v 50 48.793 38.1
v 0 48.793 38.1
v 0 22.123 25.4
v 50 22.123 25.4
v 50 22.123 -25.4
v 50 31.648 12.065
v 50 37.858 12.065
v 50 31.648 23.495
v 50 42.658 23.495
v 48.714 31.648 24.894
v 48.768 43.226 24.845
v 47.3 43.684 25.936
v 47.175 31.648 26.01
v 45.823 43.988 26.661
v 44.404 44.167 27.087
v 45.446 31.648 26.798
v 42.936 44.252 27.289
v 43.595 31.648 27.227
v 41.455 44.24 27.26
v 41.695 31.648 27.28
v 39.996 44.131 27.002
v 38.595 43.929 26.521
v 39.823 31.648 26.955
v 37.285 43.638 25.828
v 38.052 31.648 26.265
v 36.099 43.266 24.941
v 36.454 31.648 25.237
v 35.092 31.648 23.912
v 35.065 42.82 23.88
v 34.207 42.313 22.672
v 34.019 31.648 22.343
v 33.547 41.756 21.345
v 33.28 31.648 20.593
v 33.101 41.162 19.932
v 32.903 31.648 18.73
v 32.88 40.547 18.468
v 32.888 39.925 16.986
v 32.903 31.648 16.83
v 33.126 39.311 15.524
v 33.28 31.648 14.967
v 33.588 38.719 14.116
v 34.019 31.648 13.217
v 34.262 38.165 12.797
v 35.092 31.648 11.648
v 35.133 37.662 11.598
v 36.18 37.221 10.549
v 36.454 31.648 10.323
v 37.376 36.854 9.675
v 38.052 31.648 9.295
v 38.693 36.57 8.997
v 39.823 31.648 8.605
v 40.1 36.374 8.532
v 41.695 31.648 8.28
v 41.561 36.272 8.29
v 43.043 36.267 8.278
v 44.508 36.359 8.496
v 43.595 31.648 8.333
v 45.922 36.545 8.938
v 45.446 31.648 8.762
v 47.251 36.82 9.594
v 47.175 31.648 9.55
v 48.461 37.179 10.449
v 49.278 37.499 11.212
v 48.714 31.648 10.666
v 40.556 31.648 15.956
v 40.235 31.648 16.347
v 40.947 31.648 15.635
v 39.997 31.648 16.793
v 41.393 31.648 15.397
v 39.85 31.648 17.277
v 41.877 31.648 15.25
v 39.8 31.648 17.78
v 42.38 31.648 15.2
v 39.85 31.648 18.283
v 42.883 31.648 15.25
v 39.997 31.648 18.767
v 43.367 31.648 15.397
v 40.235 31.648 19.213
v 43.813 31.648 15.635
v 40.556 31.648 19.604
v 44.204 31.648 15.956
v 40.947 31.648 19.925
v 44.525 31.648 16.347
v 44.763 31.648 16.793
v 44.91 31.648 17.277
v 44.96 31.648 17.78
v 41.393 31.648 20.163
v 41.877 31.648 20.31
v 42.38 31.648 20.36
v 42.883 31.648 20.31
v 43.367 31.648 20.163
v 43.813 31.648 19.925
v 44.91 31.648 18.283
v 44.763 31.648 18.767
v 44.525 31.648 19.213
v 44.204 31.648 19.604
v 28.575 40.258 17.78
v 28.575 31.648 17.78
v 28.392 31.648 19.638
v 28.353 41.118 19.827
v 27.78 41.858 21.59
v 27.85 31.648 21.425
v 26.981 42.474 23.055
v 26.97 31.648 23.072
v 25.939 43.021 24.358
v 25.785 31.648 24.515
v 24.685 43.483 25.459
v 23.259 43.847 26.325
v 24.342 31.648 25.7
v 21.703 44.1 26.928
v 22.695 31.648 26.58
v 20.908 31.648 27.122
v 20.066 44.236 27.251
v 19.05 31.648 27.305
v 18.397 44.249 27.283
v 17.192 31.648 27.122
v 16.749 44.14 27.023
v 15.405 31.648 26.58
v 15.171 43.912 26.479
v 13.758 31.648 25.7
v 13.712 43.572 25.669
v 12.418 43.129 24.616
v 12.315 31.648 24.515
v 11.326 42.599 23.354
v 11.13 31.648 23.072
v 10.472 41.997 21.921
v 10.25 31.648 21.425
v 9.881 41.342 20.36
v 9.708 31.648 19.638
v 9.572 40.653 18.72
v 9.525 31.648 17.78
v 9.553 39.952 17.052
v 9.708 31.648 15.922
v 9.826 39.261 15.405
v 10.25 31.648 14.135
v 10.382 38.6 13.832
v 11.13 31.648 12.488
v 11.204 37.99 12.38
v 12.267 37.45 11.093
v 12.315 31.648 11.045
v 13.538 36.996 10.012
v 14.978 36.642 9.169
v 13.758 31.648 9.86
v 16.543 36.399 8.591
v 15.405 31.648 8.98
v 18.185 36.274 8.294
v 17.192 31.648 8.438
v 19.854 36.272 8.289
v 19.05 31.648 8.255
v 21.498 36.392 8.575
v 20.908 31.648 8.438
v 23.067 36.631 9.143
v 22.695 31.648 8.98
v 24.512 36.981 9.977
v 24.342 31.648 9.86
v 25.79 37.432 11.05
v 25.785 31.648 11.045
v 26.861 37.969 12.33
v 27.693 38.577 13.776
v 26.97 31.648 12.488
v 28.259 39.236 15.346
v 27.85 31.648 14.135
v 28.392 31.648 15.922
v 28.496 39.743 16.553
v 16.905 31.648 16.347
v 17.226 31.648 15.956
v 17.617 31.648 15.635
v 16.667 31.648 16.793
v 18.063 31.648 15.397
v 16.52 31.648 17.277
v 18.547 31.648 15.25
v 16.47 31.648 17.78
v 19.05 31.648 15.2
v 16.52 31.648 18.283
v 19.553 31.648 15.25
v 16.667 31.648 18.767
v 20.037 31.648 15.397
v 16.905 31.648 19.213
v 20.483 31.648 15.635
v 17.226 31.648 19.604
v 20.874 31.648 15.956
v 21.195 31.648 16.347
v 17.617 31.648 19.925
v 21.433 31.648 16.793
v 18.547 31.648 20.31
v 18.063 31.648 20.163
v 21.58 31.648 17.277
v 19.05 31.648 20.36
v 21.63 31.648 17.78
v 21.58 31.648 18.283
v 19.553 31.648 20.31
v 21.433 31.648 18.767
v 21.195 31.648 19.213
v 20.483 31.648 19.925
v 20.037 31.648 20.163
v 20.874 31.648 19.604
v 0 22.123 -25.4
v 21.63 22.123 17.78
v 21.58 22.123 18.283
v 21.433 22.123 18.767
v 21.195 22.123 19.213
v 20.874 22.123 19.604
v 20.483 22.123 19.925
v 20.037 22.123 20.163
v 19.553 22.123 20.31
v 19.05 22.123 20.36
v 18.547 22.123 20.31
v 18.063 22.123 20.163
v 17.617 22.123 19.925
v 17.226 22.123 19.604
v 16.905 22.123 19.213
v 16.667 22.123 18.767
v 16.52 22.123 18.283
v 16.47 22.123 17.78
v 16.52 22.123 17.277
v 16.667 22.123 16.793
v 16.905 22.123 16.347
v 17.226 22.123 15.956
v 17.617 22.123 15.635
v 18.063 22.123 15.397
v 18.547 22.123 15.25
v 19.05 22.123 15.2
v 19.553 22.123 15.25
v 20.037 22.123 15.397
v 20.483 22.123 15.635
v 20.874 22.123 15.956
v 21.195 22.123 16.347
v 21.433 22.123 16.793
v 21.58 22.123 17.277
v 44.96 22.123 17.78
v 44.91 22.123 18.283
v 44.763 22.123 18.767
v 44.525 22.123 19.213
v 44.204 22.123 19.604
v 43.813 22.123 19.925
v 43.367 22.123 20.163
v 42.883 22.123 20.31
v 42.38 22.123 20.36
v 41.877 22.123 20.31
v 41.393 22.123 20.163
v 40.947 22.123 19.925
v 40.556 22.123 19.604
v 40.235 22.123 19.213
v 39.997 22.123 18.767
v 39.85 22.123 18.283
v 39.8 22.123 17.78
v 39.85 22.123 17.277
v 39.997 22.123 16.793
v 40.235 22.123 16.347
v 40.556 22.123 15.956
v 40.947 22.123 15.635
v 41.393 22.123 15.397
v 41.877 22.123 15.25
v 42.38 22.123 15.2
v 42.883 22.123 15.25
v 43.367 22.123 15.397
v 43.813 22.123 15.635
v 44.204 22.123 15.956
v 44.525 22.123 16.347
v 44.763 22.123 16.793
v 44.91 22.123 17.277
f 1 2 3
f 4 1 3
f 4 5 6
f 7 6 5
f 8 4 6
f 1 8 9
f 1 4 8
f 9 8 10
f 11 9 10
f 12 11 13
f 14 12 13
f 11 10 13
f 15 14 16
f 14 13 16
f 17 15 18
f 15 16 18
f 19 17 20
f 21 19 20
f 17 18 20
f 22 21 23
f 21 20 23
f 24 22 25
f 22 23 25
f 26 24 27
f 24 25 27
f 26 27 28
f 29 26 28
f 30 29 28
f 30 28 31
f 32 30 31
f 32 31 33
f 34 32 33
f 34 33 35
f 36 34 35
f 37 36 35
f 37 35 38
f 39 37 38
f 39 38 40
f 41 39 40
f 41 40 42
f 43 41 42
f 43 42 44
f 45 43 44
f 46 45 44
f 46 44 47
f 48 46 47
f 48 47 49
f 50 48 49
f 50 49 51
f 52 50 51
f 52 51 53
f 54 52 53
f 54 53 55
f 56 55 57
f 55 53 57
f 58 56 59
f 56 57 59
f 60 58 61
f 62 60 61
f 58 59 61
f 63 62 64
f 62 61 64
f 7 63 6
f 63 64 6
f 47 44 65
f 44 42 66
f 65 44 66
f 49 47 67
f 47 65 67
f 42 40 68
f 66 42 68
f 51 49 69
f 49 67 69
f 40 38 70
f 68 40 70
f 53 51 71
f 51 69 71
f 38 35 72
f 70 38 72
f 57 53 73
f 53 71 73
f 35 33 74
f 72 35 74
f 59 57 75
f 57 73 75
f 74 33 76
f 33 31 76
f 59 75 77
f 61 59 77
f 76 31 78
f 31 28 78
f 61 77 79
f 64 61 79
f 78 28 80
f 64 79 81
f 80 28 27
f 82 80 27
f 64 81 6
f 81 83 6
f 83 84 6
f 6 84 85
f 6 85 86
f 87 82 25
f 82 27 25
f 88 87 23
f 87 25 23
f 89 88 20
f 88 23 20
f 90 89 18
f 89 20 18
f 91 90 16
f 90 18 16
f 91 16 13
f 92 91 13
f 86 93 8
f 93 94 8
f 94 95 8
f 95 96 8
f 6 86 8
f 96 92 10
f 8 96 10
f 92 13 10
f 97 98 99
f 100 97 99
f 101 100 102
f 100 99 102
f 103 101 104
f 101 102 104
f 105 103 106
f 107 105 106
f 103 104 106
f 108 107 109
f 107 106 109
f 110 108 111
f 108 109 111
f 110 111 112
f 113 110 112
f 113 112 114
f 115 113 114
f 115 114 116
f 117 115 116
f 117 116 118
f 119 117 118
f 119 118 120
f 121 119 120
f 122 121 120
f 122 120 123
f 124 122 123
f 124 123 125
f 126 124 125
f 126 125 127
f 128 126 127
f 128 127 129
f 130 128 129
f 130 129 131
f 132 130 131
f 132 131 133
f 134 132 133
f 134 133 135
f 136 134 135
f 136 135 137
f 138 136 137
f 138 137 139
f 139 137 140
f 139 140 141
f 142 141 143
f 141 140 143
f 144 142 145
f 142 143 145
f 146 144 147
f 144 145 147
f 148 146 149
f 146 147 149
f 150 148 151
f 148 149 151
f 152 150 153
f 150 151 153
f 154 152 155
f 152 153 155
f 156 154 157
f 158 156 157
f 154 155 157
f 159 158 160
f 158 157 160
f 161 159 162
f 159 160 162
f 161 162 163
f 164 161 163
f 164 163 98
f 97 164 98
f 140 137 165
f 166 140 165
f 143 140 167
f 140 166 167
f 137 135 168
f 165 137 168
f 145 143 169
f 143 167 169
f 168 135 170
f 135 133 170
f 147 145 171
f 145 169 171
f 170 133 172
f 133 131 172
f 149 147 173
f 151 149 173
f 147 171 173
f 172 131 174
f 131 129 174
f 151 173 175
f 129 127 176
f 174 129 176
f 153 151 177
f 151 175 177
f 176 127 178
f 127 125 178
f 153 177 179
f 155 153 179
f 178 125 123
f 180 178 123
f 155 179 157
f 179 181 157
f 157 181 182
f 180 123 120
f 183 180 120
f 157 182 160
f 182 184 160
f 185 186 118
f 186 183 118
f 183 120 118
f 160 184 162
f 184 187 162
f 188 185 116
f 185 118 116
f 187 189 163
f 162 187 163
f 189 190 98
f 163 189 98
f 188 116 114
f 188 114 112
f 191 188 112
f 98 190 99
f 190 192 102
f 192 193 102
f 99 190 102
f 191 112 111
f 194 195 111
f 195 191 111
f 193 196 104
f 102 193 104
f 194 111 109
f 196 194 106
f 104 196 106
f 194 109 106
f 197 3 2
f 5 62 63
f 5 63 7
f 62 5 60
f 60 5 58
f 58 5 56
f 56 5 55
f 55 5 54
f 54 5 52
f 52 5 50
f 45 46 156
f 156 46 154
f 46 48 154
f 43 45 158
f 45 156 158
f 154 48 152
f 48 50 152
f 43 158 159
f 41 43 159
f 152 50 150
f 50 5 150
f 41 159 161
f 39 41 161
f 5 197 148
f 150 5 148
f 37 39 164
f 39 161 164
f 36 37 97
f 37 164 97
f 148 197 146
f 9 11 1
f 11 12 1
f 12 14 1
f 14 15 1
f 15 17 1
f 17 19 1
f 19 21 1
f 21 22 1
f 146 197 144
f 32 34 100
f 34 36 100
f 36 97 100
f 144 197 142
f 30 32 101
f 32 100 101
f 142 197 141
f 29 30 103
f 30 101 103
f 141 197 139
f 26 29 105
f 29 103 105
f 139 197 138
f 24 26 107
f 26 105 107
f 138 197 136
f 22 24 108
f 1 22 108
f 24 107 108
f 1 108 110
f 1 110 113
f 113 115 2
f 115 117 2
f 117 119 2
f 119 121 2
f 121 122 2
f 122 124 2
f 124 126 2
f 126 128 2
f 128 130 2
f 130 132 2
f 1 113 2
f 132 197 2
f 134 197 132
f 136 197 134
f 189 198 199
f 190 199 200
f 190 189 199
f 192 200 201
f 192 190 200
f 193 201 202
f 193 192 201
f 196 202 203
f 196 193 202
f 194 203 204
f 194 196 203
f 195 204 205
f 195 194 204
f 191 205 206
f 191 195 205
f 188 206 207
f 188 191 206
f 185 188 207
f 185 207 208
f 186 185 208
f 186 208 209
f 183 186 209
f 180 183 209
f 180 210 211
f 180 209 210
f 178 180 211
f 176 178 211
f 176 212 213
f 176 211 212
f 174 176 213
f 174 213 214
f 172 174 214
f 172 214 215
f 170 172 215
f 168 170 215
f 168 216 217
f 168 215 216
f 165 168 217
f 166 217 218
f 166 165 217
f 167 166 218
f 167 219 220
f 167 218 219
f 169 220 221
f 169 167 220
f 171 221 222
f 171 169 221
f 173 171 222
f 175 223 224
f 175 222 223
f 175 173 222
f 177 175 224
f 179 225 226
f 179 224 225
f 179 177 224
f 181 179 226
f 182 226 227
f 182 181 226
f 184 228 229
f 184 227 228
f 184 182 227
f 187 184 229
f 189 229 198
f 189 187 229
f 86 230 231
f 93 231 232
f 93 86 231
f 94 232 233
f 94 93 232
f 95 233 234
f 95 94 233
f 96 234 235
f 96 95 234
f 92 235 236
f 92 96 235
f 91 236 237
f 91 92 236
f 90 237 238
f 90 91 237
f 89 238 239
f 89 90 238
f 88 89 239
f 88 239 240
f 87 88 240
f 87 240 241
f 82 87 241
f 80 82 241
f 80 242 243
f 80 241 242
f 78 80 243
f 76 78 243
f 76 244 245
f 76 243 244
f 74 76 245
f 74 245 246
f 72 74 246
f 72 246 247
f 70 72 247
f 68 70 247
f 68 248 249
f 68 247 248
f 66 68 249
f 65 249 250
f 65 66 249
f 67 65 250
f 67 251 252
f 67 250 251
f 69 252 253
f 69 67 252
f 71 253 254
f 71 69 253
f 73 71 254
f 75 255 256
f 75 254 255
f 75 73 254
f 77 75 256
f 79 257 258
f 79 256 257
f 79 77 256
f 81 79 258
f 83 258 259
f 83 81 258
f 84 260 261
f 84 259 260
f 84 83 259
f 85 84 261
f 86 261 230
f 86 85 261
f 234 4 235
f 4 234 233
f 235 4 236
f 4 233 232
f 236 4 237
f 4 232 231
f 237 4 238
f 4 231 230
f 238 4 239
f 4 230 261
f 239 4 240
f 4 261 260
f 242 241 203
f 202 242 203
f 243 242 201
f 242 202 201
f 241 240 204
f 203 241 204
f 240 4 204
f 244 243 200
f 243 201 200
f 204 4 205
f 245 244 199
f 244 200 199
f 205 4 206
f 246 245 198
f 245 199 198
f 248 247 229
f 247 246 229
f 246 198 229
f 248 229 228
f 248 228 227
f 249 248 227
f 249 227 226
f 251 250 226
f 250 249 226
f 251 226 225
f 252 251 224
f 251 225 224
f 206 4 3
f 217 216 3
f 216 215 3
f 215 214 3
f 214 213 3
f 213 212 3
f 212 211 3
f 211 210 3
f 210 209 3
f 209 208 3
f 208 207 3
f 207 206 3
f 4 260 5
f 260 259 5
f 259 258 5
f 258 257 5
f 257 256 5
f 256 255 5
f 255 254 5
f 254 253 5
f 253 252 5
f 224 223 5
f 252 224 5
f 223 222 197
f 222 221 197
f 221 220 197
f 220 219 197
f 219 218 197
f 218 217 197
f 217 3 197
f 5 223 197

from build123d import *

# Parameters (mm, degrees)
F1_DEPTH      = 50
F3_R          = 2.5796875
F4_DEPTH      = 17.146
F4_DEPTH_BACK = 9.526
F5_R          = 2.5796875
F5_R_2        = 9.525
F6_DEPTH      = 25.4


with BuildPart() as f1:
    # F0 (on Right) → F1 (new body)
    with BuildSketch(Plane.YZ):
        Polygon((22.1225786954, 25.4), (22.1225786954, -25.4), (48.7925786954, 38.1), align=None)
    extrude(amount=F1_DEPTH)

    # F3 (on offset) → F4 (cut, two sides)
    with BuildSketch(Plane.XZ.offset(-31.6475786954)) as f4_sk:
        with Locations((42.38, 17.78)):
            Circle(F3_R)
        with Locations((19.05, 17.78)):
            Circle(F3_R)
    extrude(amount=-F4_DEPTH, mode=Mode.SUBTRACT)
    extrude(f4_sk.sketch, amount=F4_DEPTH_BACK, mode=Mode.SUBTRACT)

    # F5 (on offset) → F6 (cut)
    with BuildSketch(Plane.XZ.offset(-31.6475786954)):
        with BuildLine():
            ThreePointArc((50, 12.065), (51.4162084139, 14.7679305287), (51.905, 17.78))
            ThreePointArc((51.905, 17.78), (51.4162084139, 20.7920694713), (50, 23.495))
            Line((50, 23.495), (50, 12.065))
        make_face()
        with BuildLine():
            Line((50, 12.065), (50, 23.495))
            ThreePointArc((50, 23.495), (32.855, 17.78), (50, 12.065))
        make_face()
        with Locations((42.38, 17.78)):
            Circle(F5_R, mode=Mode.SUBTRACT)
        with Locations((19.05, 17.78)):
            Circle(F5_R_2)
        with Locations((19.05, 17.78)):
            Circle(F5_R, mode=Mode.SUBTRACT)
    extrude(amount=-F6_DEPTH, mode=Mode.SUBTRACT)


solid = f1.part
